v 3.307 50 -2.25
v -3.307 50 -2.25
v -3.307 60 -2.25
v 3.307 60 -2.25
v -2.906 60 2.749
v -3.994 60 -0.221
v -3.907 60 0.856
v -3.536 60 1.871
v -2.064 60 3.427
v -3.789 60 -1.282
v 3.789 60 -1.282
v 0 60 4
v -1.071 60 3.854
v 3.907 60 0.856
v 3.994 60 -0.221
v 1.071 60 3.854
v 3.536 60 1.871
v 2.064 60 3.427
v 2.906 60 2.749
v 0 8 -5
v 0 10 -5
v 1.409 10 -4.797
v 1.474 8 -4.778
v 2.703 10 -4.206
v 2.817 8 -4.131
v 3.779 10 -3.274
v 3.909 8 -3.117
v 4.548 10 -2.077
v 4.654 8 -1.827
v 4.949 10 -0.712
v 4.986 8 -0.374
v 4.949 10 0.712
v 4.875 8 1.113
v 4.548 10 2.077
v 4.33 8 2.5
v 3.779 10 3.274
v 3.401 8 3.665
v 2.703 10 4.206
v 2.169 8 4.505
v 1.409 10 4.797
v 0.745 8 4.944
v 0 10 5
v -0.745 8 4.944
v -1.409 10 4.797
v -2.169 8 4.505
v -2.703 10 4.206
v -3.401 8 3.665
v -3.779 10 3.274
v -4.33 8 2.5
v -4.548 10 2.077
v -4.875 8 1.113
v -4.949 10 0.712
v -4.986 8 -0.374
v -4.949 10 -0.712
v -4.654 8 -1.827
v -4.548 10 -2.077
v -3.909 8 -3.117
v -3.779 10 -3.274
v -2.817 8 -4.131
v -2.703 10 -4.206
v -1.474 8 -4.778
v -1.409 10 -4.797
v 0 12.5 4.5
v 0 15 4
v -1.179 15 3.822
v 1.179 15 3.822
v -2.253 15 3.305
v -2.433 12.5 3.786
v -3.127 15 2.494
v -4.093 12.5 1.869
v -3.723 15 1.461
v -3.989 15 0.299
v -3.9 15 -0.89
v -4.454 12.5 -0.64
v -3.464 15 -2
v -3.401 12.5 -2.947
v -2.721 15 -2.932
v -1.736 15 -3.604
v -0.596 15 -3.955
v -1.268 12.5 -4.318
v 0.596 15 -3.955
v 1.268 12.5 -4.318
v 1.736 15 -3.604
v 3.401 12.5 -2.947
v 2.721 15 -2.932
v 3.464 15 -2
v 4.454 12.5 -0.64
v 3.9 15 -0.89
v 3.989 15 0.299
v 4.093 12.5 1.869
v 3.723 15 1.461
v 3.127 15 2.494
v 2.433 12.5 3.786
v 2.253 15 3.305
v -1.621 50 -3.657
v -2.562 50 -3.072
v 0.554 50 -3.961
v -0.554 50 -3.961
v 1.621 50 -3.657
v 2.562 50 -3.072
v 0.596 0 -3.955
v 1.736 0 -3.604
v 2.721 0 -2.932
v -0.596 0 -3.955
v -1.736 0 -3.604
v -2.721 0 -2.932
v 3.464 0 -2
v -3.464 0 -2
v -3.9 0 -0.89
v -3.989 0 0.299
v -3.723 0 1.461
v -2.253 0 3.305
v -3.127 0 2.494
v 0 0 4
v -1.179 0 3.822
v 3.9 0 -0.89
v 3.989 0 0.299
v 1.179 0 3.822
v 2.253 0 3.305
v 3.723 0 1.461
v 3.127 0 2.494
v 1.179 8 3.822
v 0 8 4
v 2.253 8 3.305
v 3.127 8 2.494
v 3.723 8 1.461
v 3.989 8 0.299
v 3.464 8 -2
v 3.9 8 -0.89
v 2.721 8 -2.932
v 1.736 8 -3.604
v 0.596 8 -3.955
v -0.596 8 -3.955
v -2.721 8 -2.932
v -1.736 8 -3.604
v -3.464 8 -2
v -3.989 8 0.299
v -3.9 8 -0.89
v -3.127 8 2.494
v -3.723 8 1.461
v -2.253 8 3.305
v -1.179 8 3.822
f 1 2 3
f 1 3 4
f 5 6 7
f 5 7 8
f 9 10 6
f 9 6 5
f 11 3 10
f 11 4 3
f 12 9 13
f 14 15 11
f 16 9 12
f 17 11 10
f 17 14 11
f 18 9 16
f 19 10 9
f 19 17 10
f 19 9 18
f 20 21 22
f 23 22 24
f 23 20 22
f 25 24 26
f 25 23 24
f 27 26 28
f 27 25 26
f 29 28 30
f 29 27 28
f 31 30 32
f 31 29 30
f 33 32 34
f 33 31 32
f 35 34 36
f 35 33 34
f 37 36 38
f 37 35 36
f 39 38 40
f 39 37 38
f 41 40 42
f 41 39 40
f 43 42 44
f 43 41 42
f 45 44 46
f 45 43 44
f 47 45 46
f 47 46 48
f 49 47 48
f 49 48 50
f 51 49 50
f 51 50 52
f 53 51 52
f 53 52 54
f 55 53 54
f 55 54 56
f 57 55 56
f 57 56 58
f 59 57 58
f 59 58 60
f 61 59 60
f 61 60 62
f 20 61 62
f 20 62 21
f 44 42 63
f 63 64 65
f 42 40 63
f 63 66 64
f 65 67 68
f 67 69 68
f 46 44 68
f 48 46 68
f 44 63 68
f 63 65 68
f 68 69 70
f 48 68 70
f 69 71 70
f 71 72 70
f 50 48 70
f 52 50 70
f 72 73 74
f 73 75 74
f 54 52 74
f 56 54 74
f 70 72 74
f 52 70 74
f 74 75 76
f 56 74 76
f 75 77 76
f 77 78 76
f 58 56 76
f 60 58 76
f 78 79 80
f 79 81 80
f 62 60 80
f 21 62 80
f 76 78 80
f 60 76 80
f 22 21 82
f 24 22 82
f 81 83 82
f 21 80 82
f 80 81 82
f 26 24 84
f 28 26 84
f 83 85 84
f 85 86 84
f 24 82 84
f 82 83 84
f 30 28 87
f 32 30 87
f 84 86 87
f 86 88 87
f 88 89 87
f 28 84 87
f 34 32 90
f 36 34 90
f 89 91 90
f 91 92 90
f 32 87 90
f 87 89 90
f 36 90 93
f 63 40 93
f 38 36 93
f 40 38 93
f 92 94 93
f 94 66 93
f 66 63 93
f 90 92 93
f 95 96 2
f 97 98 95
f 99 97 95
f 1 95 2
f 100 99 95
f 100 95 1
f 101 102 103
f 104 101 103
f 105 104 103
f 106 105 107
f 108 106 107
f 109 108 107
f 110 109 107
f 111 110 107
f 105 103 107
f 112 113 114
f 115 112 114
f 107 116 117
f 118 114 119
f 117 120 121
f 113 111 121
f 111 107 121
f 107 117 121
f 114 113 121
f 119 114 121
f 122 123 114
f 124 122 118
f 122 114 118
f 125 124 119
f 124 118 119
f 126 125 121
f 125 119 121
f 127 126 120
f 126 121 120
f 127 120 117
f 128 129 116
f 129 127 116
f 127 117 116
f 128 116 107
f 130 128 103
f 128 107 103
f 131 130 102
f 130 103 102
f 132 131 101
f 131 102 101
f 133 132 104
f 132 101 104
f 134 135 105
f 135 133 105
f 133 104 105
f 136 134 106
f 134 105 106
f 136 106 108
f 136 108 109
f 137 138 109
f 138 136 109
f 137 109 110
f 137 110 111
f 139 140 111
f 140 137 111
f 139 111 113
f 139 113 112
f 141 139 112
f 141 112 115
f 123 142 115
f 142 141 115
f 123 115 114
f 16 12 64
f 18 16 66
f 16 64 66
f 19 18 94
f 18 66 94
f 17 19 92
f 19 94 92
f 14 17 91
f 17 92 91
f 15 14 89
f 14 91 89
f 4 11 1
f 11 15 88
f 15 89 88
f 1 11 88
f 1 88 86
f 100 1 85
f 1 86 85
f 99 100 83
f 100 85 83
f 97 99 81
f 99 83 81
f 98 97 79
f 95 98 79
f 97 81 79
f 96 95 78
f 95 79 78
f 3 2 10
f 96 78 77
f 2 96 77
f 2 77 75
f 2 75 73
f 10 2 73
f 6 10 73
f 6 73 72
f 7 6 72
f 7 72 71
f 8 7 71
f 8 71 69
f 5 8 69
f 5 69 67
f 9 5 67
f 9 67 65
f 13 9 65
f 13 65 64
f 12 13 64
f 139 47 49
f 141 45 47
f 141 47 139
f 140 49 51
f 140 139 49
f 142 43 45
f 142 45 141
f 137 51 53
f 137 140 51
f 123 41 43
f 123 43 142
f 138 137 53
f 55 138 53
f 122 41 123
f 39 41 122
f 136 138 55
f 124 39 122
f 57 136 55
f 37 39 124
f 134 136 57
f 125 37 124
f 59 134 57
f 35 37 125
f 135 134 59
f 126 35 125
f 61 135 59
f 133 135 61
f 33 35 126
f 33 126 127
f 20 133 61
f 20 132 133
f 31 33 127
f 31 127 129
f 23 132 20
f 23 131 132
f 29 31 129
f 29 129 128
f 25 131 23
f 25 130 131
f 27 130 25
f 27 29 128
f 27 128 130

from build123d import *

# Parameters (mm, degrees)
SKETCH1_R           = 4
BOSS_EXTRUDE1_DEPTH = 60
SKETCH2_R           = 5
BOSS_EXTRUDE2_DEPTH = 2
CHAMFER1_SIZE       = 1
CHAMFER1_SIZE_2     = 5
CUT_EXTRUDE1_START  = -10
CUT_EXTRUDE1_DEPTH  = 10


with BuildPart() as part:
    # Sketch1 → Boss-Extrude1 (new body)
    with BuildSketch(Plane(origin=(0, 0, 0), x_dir=(1, 0, 0), z_dir=(0, 1, 0))):
        with Locations(Location((0, 0, 0), (0, 0, 270))):
            Circle(SKETCH1_R)
    extrude(amount=BOSS_EXTRUDE1_DEPTH)

    # Sketch2 → Boss-Extrude2 (add)
    with BuildSketch(Plane(origin=(0, 8, 0), x_dir=(-1, 0, 0), z_dir=(0, -1, 0))):
        with Locations(Location((0, 0, 0), (0, 0, 90))):
            Circle(SKETCH2_R)
    extrude(amount=-BOSS_EXTRUDE2_DEPTH)

    # Chamfer1
    # the kernel refuses this chamfer: 5, 1 mm, written as the material it adds along each edge
    with BuildSketch(Plane(origin=(0, 10, 0), x_dir=(0, 0, 1), z_dir=(1, 0, 0))) as chamfer1_piece_1_section:
        Polygon((4 + CHAMFER1_SIZE, 0), (4, -CHAMFER1_SIZE_2), (4, 0), align=None)
    chamfer1_piece_1 = revolve(axis=Axis((0, 10, 0), (0, -1, 0)), mode=Mode.PRIVATE)
    chamfer1_piece_1 = chamfer1_piece_1 & Plane(origin=(0, 12.589419048, 0), x_dir=(0, 0, -1), z_dir=(0, -1, 0)) * Cylinder(5, 20, mode=Mode.PRIVATE)
    add(chamfer1_piece_1)

    # Sketch3 → Cut-Extrude1 (cut)
    with BuildSketch(Plane(origin=(0, 60, 0), x_dir=(1, 0, 0), z_dir=(0, 1, 0)).offset(CUT_EXTRUDE1_START)):
        with BuildLine():
            Line((-3.307189139, 2.25), (3.307189139, 2.25))
            ThreePointArc((3.307189139, 2.25), (0, 4), (-3.307189139, 2.25))
        make_face()
    extrude(amount=CUT_EXTRUDE1_DEPTH, mode=Mode.SUBTRACT)


solid = part.part
